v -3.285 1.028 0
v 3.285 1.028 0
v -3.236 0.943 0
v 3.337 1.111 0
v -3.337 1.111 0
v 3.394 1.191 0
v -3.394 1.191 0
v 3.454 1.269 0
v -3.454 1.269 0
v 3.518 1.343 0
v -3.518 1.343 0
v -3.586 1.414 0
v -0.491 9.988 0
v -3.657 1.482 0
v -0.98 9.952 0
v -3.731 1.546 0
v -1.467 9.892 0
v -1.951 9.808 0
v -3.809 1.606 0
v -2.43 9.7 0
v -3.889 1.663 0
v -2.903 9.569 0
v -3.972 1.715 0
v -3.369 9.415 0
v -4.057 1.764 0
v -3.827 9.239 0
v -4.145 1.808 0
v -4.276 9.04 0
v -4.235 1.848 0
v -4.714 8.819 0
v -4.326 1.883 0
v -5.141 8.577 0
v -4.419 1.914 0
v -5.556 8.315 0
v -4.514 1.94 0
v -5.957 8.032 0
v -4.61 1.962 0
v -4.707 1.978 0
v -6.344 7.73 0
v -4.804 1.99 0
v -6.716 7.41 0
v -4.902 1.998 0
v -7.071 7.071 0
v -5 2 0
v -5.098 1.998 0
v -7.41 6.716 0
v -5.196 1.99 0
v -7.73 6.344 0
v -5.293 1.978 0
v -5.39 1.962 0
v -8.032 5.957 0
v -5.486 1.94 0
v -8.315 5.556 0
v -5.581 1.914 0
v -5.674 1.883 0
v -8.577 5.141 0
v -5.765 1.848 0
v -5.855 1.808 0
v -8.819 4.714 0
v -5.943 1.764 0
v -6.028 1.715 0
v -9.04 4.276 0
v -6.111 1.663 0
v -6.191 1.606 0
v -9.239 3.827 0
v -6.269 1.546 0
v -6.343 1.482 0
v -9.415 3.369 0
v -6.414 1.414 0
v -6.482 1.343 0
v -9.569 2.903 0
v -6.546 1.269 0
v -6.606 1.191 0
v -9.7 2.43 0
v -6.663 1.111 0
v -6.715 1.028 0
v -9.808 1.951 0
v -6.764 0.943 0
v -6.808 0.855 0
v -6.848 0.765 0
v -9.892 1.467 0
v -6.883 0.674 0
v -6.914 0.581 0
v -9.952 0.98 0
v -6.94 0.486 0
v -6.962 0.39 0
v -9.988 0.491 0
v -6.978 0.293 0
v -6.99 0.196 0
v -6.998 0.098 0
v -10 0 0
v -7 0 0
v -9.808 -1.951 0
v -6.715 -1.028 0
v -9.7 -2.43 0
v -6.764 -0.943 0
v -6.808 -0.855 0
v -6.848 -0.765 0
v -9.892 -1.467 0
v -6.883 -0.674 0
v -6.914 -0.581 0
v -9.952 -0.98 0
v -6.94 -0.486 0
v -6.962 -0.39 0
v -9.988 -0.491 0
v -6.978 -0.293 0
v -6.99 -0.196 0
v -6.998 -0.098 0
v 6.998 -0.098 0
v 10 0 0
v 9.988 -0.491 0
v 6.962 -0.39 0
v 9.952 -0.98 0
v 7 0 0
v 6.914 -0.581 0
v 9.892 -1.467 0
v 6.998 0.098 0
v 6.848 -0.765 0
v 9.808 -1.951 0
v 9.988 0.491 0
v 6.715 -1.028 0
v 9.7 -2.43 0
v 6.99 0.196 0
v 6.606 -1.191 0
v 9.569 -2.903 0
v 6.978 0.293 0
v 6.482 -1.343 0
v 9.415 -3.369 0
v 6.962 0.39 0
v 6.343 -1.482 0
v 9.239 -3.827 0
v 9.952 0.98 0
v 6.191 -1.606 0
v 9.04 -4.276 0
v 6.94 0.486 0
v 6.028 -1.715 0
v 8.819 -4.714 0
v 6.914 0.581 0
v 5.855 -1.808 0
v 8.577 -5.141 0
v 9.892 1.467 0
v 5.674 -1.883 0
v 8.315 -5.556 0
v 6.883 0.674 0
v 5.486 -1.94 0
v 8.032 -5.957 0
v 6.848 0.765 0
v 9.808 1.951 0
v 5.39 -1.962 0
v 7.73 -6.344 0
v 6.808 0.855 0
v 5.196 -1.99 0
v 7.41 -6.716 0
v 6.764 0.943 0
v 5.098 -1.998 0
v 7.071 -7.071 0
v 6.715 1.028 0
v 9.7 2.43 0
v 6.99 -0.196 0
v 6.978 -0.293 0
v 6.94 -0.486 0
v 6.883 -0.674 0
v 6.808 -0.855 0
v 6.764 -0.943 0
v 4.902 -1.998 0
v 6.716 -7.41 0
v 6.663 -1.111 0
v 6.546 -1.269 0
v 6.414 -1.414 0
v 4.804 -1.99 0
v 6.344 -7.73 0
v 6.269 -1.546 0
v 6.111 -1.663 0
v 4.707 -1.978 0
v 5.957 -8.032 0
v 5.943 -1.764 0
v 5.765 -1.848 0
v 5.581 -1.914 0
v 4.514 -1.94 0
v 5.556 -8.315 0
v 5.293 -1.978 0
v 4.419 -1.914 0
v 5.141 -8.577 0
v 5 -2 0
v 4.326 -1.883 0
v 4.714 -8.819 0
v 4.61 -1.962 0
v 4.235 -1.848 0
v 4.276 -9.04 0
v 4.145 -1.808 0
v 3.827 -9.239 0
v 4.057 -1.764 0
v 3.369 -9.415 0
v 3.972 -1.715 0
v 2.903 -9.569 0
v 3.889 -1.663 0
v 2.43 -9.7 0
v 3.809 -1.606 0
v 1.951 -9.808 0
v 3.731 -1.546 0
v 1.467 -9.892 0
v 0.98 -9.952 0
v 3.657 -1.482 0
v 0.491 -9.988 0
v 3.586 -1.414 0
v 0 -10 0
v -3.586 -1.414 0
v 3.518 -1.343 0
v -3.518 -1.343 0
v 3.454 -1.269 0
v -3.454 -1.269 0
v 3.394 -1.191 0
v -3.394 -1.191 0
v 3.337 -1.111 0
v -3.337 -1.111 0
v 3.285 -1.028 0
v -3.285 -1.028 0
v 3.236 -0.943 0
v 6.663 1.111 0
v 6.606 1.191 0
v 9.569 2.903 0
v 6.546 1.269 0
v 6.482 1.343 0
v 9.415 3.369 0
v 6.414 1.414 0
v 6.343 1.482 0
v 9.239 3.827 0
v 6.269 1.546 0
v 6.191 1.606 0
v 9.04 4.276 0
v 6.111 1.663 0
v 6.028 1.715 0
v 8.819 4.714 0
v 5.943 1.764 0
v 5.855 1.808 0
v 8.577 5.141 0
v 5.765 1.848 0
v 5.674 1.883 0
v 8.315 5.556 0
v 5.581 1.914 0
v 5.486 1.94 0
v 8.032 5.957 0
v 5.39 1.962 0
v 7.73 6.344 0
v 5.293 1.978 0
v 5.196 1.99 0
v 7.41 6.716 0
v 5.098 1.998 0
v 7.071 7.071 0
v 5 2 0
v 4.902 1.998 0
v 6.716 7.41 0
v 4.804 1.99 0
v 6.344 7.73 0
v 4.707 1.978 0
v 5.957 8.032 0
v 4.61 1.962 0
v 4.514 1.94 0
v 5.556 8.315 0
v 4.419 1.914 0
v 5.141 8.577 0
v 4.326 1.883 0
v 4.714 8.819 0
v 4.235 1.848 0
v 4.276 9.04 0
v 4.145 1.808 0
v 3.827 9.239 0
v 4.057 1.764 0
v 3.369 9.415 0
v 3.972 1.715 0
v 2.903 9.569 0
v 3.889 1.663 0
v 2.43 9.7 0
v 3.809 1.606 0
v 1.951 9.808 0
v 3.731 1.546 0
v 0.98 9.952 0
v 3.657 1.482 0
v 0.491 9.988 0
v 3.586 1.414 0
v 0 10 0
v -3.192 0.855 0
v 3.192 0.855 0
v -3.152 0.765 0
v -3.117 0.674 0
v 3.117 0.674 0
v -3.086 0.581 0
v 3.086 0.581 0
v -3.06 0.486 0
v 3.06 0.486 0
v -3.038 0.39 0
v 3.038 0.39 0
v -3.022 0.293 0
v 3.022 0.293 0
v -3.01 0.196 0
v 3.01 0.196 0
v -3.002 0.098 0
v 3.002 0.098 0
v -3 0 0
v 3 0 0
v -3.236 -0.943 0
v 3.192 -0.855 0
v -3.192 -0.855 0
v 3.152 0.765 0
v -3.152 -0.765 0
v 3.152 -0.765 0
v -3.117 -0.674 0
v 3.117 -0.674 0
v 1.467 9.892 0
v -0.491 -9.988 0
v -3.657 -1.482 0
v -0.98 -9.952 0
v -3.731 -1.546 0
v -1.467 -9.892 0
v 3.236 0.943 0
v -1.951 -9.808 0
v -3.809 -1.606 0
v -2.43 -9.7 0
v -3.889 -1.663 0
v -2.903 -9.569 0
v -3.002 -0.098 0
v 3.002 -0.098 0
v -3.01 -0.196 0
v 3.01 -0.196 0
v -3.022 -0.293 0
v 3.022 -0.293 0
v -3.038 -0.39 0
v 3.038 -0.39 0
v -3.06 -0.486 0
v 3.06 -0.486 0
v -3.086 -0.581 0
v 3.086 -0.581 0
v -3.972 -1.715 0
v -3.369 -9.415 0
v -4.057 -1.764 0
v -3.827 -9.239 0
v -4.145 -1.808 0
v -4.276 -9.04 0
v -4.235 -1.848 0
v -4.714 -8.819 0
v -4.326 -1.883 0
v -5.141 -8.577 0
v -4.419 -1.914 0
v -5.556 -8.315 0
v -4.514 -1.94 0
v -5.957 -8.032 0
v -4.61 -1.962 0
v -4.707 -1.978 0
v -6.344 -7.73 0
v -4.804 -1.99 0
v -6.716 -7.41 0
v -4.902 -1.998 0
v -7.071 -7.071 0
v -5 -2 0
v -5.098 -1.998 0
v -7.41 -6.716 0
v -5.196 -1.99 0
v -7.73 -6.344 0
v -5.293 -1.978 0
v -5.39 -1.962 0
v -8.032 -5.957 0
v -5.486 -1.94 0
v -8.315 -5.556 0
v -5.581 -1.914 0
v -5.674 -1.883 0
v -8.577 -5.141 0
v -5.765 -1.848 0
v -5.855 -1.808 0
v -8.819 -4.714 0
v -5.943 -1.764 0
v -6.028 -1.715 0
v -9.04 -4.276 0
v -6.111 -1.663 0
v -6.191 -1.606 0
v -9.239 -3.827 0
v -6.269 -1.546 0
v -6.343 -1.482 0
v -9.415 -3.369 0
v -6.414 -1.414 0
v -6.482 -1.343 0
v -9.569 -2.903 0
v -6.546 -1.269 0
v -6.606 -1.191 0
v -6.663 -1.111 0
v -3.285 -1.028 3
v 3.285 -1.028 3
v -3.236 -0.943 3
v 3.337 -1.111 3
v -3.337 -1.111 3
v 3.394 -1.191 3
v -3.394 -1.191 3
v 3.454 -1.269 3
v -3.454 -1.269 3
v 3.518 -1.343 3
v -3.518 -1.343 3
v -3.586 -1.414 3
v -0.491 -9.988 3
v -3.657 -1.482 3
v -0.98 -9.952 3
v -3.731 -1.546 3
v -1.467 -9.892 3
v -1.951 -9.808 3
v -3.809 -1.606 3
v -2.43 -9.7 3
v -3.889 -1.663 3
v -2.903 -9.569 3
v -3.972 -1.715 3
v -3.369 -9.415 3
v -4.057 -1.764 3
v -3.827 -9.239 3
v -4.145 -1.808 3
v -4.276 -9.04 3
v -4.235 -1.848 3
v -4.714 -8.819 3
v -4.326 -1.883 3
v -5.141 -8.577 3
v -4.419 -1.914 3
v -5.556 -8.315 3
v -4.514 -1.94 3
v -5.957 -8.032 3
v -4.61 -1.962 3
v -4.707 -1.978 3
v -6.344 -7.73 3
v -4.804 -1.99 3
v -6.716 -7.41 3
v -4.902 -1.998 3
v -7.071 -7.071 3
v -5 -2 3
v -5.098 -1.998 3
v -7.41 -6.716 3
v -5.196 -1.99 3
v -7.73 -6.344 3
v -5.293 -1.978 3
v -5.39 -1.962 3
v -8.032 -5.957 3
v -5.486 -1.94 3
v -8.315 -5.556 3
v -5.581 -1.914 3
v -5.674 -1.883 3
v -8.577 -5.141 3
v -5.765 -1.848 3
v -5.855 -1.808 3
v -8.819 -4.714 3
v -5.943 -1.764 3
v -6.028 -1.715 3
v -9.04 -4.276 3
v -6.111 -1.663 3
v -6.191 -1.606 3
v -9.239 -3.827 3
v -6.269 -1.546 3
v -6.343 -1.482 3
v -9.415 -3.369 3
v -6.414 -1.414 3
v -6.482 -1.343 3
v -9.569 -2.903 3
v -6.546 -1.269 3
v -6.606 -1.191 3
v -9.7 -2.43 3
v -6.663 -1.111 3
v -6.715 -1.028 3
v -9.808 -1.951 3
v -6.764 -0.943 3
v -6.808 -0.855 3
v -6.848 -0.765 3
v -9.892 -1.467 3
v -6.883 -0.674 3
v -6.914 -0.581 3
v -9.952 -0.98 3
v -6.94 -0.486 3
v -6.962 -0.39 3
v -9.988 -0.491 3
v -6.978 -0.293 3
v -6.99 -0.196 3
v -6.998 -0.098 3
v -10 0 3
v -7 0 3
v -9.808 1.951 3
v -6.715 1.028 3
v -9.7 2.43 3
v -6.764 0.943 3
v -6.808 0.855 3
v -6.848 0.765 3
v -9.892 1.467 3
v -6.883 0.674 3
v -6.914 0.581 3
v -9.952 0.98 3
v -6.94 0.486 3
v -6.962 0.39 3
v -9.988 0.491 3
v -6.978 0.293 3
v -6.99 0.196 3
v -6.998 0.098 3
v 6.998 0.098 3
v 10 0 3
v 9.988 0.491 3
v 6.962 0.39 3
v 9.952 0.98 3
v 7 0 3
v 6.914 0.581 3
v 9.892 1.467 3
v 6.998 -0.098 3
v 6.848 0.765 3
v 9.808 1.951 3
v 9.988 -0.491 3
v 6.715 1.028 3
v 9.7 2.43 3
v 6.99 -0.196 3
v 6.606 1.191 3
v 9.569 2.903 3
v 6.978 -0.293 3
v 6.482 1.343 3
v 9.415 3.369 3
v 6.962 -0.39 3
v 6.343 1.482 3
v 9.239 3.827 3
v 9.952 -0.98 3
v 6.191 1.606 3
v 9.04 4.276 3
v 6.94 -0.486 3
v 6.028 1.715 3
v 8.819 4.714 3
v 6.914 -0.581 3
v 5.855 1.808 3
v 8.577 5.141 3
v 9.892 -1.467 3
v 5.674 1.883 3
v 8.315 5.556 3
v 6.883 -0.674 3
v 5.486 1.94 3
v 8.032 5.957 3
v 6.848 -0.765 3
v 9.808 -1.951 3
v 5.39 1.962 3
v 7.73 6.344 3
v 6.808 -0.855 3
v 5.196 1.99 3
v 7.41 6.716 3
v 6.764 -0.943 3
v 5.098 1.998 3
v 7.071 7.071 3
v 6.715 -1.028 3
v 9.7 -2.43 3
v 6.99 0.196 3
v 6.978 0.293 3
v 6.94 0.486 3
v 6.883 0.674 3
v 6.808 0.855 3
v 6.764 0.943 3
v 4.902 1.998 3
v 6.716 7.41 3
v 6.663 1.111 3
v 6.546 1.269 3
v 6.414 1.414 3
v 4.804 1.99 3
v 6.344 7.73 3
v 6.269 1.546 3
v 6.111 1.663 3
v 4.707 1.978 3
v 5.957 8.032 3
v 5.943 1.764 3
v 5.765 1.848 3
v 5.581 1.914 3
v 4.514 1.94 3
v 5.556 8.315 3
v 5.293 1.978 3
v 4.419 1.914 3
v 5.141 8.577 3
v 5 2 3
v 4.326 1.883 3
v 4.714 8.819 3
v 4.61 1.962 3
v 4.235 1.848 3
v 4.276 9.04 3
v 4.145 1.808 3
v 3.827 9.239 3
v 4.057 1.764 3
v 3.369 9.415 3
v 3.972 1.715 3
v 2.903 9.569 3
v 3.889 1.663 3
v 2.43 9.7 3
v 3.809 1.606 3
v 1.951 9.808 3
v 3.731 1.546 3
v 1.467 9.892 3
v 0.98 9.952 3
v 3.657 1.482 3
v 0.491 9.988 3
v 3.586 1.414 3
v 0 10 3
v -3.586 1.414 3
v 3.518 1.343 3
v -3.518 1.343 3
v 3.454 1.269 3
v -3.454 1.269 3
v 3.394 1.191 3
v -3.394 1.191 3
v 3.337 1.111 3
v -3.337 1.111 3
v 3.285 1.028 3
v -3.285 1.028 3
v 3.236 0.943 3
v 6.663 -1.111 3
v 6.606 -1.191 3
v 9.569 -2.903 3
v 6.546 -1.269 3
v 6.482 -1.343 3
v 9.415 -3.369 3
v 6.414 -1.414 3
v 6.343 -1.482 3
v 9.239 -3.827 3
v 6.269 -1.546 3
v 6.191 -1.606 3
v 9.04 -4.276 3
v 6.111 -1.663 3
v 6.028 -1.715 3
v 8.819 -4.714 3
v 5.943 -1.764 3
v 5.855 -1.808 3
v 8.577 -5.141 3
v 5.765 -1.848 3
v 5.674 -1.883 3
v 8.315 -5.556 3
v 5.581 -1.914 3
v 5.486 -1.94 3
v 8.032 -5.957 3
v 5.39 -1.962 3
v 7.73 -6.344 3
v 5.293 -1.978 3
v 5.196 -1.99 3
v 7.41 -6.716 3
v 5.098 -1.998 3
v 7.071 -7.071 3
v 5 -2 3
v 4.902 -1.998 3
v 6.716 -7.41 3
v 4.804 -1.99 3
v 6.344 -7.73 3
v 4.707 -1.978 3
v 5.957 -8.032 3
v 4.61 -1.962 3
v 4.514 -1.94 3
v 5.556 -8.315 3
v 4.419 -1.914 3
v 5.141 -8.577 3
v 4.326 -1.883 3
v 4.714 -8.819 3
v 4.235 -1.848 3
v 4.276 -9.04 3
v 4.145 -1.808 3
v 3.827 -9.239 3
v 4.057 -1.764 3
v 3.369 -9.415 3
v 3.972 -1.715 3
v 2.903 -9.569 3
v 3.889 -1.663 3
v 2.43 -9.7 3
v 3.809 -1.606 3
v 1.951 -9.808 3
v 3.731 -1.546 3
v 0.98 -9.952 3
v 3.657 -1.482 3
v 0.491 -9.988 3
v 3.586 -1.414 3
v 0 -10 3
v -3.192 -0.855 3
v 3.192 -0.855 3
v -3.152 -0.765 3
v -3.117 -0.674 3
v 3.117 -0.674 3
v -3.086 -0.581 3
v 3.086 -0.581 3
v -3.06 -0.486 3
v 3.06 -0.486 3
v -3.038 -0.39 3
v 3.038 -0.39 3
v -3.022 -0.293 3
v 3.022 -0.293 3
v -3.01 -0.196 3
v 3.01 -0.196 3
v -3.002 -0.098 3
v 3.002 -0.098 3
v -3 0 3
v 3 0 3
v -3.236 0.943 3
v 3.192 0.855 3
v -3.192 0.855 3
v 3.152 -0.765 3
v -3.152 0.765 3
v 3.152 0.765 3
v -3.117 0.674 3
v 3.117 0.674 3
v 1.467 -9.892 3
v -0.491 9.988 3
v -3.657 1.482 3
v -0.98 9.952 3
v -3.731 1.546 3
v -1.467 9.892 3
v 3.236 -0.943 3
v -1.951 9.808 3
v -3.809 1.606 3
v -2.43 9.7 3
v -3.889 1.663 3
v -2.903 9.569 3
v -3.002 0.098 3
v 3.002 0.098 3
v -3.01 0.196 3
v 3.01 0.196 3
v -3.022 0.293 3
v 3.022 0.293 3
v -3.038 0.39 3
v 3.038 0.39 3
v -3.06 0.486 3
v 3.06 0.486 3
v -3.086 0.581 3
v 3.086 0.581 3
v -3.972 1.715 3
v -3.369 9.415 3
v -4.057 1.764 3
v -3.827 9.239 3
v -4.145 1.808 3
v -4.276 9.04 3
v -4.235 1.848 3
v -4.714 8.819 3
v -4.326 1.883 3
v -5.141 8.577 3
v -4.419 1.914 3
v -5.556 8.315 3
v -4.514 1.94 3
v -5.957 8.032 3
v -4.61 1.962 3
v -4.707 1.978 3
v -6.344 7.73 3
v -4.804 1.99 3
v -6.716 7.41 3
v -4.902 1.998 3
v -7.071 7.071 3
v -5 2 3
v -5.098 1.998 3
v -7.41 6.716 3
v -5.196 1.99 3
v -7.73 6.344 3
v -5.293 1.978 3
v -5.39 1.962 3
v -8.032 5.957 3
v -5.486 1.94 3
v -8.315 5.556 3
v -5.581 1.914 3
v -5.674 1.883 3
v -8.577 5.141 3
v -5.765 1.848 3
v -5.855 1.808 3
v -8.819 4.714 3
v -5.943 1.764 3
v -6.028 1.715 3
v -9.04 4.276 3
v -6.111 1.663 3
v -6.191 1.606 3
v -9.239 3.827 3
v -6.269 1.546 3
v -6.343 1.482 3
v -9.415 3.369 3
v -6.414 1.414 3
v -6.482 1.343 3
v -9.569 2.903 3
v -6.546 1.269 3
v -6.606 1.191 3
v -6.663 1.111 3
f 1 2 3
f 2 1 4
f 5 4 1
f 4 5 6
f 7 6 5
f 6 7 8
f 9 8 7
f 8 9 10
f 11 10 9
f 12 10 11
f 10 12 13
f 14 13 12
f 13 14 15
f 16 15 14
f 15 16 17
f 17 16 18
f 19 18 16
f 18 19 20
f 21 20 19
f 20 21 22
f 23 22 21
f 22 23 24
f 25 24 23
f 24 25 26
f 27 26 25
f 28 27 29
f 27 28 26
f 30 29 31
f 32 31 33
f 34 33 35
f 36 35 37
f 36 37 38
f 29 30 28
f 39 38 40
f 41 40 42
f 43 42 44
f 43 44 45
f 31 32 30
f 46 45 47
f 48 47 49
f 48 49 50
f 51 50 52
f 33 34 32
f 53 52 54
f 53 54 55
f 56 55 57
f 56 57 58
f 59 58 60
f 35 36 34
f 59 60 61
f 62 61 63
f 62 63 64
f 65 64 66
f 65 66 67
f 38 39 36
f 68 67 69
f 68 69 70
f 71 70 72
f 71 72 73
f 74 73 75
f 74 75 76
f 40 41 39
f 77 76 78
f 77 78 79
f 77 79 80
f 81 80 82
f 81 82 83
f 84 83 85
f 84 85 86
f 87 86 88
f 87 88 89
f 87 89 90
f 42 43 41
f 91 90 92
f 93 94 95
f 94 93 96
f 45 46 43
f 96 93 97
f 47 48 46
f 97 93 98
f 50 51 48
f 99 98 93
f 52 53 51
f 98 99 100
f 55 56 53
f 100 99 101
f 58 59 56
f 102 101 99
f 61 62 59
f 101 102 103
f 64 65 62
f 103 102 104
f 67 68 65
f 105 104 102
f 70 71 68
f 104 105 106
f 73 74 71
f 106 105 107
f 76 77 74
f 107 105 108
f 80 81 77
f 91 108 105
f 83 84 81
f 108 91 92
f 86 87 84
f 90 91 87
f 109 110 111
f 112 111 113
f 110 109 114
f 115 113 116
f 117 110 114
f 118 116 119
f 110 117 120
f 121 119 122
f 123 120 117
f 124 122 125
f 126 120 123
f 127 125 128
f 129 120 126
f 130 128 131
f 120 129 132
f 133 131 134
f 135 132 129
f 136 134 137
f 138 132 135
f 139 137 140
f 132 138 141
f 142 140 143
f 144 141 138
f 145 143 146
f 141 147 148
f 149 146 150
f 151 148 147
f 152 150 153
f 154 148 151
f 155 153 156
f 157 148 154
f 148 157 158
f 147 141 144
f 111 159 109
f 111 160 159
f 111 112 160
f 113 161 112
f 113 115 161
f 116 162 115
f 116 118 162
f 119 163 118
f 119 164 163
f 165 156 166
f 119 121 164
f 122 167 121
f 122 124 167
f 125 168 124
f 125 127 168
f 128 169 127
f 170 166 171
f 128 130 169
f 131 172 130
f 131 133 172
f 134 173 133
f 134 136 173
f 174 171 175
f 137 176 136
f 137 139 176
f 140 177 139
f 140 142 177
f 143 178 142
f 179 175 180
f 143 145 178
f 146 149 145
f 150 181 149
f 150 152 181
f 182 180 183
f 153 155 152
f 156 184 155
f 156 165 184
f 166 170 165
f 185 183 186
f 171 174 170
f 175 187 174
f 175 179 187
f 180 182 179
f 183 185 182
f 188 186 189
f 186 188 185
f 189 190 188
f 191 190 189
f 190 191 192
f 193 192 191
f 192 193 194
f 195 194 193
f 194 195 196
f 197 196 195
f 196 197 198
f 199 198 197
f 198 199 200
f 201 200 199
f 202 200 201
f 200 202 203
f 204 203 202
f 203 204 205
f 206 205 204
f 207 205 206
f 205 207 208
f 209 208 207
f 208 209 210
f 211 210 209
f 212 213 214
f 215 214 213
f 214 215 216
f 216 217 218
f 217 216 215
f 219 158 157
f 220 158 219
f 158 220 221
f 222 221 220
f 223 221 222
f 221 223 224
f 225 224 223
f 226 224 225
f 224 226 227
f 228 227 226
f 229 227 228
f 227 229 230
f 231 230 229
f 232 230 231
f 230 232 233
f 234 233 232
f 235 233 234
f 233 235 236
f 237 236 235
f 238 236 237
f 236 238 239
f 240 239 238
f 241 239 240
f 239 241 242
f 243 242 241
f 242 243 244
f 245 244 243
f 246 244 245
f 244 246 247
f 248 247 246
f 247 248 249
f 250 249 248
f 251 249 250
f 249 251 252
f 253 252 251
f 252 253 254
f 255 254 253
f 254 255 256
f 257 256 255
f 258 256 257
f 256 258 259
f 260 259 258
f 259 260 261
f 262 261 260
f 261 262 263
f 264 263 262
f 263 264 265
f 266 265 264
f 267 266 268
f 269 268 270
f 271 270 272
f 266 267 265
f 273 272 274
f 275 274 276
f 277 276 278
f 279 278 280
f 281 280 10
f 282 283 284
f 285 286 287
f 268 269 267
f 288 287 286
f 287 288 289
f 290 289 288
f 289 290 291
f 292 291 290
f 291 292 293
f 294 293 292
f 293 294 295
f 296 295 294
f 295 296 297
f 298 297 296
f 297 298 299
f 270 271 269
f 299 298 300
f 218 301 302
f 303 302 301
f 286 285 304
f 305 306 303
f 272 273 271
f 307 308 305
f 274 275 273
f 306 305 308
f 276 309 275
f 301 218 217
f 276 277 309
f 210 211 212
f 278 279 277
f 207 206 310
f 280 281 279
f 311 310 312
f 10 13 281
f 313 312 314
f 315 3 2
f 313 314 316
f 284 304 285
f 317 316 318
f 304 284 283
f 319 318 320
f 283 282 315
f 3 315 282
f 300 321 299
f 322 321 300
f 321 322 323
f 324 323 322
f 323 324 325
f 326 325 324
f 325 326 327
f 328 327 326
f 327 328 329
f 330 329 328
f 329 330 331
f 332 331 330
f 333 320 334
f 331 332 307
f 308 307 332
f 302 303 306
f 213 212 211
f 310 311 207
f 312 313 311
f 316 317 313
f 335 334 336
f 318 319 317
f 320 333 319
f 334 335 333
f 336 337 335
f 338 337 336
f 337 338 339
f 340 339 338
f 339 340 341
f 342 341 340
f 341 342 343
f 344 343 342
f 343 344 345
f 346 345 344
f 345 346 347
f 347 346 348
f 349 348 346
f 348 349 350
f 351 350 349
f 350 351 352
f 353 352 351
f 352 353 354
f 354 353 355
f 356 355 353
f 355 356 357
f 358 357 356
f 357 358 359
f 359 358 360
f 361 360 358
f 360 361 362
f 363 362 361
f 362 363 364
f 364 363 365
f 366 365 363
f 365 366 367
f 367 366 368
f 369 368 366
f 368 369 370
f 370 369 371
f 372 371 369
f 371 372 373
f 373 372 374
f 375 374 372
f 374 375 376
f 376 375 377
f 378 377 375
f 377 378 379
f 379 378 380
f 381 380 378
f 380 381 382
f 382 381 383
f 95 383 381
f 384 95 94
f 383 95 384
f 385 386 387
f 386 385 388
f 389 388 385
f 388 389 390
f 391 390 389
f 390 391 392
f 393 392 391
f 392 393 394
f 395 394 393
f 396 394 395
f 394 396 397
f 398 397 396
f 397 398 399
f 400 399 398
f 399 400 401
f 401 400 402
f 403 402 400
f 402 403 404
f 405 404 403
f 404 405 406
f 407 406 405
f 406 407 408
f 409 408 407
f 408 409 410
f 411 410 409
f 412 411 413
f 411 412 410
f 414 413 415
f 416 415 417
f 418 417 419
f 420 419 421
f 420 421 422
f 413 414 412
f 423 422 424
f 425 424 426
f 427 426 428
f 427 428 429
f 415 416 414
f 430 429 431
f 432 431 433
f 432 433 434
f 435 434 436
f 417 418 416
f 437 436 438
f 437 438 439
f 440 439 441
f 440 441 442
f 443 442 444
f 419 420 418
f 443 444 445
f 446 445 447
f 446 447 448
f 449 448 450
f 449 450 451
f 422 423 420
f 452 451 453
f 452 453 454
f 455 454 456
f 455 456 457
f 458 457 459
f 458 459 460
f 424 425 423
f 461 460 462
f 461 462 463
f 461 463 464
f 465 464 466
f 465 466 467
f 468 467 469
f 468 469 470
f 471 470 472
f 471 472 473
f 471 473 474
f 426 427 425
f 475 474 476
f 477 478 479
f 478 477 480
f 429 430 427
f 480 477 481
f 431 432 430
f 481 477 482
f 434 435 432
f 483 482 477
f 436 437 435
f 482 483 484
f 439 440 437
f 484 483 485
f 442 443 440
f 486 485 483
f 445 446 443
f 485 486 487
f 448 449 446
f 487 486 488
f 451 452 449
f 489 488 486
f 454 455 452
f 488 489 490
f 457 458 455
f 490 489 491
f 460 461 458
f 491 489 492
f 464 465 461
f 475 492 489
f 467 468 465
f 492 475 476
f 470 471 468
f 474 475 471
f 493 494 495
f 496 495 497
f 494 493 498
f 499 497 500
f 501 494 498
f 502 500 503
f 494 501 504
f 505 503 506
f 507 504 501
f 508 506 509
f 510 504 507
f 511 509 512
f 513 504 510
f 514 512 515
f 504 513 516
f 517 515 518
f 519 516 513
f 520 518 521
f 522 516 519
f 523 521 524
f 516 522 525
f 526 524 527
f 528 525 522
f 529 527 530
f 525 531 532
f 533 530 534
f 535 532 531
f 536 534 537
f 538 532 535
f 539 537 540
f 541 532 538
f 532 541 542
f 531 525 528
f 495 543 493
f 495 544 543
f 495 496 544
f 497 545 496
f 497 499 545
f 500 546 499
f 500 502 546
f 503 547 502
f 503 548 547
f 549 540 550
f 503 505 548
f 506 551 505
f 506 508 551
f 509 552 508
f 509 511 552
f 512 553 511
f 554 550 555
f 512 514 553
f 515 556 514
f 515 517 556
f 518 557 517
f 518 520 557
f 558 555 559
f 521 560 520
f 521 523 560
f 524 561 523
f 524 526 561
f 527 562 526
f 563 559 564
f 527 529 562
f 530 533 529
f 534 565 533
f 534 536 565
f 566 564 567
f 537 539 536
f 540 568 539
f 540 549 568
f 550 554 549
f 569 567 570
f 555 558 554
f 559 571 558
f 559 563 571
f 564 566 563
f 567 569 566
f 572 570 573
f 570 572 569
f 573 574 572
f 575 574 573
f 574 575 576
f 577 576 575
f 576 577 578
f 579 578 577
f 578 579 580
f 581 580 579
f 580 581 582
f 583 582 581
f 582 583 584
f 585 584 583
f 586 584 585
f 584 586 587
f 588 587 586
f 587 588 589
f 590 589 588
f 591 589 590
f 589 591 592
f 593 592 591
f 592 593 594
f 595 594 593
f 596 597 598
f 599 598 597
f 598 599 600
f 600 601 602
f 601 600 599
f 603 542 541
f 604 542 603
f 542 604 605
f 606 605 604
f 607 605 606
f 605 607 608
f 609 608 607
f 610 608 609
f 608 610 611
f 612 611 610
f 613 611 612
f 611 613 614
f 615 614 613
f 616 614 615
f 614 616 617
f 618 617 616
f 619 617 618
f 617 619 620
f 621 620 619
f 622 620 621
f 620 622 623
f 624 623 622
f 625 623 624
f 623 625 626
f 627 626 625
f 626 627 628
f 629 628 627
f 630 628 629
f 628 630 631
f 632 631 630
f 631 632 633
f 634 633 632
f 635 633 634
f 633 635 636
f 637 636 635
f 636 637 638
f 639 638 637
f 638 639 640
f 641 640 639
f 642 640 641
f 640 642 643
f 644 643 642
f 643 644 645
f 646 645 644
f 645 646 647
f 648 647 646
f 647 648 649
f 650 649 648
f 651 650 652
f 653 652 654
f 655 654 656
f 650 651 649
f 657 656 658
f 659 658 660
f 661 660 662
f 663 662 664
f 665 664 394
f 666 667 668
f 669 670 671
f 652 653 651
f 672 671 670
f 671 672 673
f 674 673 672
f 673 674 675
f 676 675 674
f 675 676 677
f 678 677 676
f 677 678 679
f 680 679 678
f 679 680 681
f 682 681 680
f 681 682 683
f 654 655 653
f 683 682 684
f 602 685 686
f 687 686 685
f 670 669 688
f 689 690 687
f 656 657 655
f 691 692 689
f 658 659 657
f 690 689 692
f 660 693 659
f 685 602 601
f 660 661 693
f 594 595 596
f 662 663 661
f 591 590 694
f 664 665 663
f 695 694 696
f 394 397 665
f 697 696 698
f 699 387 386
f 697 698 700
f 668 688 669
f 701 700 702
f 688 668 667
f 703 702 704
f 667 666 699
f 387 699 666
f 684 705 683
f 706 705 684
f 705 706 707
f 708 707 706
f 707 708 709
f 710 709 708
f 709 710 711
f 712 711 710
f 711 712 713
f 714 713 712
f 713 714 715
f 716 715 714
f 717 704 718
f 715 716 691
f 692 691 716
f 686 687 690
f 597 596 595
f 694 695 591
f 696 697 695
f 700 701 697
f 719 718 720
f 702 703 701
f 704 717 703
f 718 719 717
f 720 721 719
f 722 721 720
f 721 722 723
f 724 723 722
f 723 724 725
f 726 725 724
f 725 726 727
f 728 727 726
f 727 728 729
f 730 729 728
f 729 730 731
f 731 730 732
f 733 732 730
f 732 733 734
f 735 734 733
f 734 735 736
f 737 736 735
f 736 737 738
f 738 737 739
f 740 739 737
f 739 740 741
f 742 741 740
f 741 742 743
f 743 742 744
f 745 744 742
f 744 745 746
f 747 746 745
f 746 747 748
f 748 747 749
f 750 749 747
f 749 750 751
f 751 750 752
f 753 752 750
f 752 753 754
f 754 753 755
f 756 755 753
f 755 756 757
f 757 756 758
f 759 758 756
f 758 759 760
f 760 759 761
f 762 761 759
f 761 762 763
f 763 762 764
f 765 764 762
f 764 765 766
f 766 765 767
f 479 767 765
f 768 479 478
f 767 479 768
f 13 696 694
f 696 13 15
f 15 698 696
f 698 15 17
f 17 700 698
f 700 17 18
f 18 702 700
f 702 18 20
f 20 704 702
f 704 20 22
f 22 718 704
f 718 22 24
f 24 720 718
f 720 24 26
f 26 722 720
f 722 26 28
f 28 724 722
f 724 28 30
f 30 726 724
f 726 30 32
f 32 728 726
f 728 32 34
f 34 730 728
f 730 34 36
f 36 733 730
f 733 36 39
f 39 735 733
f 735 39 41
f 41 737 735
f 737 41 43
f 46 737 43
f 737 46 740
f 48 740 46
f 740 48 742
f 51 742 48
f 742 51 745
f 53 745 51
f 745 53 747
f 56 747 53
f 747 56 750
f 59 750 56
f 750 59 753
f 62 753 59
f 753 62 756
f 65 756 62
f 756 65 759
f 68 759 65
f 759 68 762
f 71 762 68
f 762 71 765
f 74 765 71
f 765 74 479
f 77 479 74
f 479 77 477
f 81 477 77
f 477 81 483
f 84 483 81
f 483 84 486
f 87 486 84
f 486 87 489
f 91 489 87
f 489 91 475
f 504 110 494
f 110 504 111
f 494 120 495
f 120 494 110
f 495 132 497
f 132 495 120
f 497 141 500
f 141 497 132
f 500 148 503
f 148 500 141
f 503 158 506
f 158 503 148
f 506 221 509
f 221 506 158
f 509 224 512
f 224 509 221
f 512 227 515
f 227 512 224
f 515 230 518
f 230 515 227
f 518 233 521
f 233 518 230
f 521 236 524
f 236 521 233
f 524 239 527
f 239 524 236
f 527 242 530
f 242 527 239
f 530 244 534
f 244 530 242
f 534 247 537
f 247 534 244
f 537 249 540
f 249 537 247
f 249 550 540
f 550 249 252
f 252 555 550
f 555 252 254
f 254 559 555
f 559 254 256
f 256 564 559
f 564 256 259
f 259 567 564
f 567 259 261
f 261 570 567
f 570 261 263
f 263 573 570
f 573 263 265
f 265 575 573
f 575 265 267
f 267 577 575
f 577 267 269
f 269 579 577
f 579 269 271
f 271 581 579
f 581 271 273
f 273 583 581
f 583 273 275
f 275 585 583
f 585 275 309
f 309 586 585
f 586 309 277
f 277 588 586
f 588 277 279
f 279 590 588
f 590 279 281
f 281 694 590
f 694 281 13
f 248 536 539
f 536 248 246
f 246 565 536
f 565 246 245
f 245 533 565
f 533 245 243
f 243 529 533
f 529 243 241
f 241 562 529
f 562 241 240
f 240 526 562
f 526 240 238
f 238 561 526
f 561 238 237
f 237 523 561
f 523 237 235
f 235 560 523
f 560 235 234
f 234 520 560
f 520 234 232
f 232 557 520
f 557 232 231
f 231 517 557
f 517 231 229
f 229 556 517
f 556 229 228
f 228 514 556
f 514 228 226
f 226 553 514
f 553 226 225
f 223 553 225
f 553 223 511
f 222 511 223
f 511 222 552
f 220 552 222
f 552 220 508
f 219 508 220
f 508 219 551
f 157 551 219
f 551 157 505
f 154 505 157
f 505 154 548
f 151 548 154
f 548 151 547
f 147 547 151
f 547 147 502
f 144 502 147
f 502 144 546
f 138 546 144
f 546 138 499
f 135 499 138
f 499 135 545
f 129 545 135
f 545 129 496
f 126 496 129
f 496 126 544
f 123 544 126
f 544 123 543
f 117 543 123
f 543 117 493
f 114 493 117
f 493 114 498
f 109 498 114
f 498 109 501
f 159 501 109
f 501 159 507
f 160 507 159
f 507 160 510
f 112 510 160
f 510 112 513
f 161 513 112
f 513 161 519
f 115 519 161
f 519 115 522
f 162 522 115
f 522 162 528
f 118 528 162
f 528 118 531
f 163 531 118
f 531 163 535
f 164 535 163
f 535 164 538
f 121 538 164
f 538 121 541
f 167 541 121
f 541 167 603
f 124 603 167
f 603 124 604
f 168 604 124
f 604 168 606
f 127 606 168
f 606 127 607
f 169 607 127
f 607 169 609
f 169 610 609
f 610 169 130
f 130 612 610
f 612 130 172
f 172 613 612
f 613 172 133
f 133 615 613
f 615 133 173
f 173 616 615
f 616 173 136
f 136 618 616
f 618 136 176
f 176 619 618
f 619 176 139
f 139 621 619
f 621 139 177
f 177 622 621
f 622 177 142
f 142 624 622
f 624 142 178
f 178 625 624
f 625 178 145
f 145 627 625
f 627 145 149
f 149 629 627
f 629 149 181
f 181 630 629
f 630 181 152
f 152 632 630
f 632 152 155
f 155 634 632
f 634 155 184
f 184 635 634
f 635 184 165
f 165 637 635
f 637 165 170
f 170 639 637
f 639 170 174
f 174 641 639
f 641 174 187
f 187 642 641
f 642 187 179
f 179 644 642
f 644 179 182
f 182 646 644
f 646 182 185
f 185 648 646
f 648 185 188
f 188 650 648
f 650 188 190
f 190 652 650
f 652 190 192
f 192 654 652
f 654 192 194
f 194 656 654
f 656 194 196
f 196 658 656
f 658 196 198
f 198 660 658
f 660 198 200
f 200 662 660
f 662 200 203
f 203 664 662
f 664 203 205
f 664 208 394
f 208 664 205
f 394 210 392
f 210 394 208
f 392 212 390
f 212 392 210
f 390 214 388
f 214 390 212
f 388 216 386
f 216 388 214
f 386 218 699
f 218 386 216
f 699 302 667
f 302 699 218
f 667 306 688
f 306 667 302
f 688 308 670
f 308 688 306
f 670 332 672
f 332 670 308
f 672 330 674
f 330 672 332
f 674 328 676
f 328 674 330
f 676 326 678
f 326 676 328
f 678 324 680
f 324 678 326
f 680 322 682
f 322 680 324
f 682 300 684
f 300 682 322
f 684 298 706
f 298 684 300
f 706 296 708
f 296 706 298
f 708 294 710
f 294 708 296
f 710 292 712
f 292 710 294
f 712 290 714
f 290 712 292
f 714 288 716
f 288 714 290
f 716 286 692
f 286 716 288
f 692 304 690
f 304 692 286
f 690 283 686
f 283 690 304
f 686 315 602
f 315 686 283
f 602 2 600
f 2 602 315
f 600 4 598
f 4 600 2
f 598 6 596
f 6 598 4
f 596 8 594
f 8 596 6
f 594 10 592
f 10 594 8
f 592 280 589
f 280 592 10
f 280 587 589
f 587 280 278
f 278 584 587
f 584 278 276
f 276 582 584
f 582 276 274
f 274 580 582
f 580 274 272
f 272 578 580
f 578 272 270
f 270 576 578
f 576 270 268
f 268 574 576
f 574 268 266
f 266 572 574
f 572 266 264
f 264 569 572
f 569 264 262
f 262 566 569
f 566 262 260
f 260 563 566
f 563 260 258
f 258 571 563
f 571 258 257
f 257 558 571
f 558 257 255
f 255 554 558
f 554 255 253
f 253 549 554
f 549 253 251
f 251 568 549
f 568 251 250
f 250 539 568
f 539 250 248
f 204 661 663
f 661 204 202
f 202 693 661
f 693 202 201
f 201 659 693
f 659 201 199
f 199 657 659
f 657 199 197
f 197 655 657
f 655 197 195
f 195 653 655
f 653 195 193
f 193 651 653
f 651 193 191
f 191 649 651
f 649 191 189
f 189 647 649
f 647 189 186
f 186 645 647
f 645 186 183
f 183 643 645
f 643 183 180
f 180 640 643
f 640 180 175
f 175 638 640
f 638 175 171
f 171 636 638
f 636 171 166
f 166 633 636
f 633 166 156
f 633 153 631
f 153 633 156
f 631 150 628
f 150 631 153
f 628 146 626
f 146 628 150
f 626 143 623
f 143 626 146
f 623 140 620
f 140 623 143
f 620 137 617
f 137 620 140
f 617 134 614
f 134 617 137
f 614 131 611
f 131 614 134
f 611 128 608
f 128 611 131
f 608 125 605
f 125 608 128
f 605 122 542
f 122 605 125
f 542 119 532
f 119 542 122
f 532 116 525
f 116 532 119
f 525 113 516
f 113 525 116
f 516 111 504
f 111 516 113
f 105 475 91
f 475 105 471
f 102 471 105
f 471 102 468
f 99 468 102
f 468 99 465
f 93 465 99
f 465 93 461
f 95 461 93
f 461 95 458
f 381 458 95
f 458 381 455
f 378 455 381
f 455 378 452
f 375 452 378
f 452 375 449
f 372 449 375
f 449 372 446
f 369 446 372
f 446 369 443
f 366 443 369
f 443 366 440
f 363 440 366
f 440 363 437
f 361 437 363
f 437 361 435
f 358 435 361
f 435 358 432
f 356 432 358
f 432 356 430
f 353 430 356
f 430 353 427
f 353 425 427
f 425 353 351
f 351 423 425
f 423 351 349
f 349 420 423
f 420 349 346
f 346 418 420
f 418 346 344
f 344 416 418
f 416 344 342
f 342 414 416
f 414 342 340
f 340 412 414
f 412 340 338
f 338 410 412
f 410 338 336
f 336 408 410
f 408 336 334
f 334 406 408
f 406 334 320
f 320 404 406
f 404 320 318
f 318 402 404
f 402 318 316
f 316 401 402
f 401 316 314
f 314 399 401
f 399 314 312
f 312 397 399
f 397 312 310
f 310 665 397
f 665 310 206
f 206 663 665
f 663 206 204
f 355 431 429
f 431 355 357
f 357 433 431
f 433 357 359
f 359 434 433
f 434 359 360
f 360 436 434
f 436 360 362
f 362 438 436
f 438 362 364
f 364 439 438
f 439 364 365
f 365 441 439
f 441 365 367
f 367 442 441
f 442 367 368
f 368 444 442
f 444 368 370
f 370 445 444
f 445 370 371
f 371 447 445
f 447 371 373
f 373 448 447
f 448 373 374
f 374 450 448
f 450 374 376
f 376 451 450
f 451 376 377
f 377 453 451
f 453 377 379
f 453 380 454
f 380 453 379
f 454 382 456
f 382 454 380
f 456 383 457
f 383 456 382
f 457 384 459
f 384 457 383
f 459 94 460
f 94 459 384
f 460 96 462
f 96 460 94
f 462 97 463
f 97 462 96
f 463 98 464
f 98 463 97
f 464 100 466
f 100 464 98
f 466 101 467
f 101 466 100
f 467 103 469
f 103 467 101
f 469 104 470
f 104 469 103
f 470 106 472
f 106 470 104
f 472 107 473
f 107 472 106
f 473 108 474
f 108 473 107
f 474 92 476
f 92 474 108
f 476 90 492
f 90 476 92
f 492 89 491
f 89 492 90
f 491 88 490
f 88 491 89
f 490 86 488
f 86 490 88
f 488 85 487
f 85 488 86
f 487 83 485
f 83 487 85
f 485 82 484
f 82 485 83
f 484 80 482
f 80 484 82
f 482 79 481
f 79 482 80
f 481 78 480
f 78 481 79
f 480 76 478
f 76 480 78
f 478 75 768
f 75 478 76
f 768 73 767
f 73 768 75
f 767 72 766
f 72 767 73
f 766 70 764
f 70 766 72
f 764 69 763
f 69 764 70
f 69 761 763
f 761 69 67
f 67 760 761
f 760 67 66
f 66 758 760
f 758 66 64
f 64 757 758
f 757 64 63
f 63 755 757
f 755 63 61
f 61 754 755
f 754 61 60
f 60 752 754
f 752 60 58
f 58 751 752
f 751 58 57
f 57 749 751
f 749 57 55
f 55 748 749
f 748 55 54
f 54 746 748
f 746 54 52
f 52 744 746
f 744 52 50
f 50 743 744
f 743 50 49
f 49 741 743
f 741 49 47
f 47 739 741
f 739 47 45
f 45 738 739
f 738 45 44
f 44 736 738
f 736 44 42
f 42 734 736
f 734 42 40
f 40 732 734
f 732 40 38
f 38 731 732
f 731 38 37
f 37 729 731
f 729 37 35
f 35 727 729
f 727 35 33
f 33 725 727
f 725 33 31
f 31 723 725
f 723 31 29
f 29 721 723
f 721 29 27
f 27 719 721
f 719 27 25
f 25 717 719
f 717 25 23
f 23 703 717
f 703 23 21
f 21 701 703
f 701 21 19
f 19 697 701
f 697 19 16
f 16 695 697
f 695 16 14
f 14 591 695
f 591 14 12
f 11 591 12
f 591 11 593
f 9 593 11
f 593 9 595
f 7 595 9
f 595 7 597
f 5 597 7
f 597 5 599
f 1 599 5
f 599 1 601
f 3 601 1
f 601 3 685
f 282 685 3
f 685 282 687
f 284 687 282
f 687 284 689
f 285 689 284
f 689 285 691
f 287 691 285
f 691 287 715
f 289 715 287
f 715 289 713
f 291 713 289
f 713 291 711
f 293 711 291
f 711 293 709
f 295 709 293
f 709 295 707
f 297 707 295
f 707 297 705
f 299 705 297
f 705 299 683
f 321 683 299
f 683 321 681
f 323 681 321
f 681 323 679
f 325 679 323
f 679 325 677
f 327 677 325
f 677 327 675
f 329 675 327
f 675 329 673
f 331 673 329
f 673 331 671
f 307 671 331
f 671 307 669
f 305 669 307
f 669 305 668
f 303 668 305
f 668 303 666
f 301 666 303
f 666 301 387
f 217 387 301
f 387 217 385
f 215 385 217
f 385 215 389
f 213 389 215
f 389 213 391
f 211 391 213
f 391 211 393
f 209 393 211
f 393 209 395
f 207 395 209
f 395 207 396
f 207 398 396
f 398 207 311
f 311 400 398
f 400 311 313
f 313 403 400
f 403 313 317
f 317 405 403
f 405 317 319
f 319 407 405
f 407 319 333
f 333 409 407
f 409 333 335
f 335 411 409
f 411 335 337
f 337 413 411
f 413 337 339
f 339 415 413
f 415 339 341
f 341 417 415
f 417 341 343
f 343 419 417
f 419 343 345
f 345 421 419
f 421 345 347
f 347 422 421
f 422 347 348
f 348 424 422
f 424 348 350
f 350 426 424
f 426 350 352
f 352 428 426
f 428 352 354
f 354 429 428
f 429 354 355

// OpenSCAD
$fn=128;

module yinyang(color="Black") {
   color(color) linear_extrude(3) difference() {
   union() {
      translate([-5,0]) circle(5);

      difference() {
         circle(10);
         translate([-10,0]) square(20);
         translate([5,0,0]) circle(5);
         translate([5,0,0]) circle(5);
      }
   }
   translate([-5,0]) circle(2);
   }
}

rotate([0,0,180]) yinyang("Black");
yinyang("White");
